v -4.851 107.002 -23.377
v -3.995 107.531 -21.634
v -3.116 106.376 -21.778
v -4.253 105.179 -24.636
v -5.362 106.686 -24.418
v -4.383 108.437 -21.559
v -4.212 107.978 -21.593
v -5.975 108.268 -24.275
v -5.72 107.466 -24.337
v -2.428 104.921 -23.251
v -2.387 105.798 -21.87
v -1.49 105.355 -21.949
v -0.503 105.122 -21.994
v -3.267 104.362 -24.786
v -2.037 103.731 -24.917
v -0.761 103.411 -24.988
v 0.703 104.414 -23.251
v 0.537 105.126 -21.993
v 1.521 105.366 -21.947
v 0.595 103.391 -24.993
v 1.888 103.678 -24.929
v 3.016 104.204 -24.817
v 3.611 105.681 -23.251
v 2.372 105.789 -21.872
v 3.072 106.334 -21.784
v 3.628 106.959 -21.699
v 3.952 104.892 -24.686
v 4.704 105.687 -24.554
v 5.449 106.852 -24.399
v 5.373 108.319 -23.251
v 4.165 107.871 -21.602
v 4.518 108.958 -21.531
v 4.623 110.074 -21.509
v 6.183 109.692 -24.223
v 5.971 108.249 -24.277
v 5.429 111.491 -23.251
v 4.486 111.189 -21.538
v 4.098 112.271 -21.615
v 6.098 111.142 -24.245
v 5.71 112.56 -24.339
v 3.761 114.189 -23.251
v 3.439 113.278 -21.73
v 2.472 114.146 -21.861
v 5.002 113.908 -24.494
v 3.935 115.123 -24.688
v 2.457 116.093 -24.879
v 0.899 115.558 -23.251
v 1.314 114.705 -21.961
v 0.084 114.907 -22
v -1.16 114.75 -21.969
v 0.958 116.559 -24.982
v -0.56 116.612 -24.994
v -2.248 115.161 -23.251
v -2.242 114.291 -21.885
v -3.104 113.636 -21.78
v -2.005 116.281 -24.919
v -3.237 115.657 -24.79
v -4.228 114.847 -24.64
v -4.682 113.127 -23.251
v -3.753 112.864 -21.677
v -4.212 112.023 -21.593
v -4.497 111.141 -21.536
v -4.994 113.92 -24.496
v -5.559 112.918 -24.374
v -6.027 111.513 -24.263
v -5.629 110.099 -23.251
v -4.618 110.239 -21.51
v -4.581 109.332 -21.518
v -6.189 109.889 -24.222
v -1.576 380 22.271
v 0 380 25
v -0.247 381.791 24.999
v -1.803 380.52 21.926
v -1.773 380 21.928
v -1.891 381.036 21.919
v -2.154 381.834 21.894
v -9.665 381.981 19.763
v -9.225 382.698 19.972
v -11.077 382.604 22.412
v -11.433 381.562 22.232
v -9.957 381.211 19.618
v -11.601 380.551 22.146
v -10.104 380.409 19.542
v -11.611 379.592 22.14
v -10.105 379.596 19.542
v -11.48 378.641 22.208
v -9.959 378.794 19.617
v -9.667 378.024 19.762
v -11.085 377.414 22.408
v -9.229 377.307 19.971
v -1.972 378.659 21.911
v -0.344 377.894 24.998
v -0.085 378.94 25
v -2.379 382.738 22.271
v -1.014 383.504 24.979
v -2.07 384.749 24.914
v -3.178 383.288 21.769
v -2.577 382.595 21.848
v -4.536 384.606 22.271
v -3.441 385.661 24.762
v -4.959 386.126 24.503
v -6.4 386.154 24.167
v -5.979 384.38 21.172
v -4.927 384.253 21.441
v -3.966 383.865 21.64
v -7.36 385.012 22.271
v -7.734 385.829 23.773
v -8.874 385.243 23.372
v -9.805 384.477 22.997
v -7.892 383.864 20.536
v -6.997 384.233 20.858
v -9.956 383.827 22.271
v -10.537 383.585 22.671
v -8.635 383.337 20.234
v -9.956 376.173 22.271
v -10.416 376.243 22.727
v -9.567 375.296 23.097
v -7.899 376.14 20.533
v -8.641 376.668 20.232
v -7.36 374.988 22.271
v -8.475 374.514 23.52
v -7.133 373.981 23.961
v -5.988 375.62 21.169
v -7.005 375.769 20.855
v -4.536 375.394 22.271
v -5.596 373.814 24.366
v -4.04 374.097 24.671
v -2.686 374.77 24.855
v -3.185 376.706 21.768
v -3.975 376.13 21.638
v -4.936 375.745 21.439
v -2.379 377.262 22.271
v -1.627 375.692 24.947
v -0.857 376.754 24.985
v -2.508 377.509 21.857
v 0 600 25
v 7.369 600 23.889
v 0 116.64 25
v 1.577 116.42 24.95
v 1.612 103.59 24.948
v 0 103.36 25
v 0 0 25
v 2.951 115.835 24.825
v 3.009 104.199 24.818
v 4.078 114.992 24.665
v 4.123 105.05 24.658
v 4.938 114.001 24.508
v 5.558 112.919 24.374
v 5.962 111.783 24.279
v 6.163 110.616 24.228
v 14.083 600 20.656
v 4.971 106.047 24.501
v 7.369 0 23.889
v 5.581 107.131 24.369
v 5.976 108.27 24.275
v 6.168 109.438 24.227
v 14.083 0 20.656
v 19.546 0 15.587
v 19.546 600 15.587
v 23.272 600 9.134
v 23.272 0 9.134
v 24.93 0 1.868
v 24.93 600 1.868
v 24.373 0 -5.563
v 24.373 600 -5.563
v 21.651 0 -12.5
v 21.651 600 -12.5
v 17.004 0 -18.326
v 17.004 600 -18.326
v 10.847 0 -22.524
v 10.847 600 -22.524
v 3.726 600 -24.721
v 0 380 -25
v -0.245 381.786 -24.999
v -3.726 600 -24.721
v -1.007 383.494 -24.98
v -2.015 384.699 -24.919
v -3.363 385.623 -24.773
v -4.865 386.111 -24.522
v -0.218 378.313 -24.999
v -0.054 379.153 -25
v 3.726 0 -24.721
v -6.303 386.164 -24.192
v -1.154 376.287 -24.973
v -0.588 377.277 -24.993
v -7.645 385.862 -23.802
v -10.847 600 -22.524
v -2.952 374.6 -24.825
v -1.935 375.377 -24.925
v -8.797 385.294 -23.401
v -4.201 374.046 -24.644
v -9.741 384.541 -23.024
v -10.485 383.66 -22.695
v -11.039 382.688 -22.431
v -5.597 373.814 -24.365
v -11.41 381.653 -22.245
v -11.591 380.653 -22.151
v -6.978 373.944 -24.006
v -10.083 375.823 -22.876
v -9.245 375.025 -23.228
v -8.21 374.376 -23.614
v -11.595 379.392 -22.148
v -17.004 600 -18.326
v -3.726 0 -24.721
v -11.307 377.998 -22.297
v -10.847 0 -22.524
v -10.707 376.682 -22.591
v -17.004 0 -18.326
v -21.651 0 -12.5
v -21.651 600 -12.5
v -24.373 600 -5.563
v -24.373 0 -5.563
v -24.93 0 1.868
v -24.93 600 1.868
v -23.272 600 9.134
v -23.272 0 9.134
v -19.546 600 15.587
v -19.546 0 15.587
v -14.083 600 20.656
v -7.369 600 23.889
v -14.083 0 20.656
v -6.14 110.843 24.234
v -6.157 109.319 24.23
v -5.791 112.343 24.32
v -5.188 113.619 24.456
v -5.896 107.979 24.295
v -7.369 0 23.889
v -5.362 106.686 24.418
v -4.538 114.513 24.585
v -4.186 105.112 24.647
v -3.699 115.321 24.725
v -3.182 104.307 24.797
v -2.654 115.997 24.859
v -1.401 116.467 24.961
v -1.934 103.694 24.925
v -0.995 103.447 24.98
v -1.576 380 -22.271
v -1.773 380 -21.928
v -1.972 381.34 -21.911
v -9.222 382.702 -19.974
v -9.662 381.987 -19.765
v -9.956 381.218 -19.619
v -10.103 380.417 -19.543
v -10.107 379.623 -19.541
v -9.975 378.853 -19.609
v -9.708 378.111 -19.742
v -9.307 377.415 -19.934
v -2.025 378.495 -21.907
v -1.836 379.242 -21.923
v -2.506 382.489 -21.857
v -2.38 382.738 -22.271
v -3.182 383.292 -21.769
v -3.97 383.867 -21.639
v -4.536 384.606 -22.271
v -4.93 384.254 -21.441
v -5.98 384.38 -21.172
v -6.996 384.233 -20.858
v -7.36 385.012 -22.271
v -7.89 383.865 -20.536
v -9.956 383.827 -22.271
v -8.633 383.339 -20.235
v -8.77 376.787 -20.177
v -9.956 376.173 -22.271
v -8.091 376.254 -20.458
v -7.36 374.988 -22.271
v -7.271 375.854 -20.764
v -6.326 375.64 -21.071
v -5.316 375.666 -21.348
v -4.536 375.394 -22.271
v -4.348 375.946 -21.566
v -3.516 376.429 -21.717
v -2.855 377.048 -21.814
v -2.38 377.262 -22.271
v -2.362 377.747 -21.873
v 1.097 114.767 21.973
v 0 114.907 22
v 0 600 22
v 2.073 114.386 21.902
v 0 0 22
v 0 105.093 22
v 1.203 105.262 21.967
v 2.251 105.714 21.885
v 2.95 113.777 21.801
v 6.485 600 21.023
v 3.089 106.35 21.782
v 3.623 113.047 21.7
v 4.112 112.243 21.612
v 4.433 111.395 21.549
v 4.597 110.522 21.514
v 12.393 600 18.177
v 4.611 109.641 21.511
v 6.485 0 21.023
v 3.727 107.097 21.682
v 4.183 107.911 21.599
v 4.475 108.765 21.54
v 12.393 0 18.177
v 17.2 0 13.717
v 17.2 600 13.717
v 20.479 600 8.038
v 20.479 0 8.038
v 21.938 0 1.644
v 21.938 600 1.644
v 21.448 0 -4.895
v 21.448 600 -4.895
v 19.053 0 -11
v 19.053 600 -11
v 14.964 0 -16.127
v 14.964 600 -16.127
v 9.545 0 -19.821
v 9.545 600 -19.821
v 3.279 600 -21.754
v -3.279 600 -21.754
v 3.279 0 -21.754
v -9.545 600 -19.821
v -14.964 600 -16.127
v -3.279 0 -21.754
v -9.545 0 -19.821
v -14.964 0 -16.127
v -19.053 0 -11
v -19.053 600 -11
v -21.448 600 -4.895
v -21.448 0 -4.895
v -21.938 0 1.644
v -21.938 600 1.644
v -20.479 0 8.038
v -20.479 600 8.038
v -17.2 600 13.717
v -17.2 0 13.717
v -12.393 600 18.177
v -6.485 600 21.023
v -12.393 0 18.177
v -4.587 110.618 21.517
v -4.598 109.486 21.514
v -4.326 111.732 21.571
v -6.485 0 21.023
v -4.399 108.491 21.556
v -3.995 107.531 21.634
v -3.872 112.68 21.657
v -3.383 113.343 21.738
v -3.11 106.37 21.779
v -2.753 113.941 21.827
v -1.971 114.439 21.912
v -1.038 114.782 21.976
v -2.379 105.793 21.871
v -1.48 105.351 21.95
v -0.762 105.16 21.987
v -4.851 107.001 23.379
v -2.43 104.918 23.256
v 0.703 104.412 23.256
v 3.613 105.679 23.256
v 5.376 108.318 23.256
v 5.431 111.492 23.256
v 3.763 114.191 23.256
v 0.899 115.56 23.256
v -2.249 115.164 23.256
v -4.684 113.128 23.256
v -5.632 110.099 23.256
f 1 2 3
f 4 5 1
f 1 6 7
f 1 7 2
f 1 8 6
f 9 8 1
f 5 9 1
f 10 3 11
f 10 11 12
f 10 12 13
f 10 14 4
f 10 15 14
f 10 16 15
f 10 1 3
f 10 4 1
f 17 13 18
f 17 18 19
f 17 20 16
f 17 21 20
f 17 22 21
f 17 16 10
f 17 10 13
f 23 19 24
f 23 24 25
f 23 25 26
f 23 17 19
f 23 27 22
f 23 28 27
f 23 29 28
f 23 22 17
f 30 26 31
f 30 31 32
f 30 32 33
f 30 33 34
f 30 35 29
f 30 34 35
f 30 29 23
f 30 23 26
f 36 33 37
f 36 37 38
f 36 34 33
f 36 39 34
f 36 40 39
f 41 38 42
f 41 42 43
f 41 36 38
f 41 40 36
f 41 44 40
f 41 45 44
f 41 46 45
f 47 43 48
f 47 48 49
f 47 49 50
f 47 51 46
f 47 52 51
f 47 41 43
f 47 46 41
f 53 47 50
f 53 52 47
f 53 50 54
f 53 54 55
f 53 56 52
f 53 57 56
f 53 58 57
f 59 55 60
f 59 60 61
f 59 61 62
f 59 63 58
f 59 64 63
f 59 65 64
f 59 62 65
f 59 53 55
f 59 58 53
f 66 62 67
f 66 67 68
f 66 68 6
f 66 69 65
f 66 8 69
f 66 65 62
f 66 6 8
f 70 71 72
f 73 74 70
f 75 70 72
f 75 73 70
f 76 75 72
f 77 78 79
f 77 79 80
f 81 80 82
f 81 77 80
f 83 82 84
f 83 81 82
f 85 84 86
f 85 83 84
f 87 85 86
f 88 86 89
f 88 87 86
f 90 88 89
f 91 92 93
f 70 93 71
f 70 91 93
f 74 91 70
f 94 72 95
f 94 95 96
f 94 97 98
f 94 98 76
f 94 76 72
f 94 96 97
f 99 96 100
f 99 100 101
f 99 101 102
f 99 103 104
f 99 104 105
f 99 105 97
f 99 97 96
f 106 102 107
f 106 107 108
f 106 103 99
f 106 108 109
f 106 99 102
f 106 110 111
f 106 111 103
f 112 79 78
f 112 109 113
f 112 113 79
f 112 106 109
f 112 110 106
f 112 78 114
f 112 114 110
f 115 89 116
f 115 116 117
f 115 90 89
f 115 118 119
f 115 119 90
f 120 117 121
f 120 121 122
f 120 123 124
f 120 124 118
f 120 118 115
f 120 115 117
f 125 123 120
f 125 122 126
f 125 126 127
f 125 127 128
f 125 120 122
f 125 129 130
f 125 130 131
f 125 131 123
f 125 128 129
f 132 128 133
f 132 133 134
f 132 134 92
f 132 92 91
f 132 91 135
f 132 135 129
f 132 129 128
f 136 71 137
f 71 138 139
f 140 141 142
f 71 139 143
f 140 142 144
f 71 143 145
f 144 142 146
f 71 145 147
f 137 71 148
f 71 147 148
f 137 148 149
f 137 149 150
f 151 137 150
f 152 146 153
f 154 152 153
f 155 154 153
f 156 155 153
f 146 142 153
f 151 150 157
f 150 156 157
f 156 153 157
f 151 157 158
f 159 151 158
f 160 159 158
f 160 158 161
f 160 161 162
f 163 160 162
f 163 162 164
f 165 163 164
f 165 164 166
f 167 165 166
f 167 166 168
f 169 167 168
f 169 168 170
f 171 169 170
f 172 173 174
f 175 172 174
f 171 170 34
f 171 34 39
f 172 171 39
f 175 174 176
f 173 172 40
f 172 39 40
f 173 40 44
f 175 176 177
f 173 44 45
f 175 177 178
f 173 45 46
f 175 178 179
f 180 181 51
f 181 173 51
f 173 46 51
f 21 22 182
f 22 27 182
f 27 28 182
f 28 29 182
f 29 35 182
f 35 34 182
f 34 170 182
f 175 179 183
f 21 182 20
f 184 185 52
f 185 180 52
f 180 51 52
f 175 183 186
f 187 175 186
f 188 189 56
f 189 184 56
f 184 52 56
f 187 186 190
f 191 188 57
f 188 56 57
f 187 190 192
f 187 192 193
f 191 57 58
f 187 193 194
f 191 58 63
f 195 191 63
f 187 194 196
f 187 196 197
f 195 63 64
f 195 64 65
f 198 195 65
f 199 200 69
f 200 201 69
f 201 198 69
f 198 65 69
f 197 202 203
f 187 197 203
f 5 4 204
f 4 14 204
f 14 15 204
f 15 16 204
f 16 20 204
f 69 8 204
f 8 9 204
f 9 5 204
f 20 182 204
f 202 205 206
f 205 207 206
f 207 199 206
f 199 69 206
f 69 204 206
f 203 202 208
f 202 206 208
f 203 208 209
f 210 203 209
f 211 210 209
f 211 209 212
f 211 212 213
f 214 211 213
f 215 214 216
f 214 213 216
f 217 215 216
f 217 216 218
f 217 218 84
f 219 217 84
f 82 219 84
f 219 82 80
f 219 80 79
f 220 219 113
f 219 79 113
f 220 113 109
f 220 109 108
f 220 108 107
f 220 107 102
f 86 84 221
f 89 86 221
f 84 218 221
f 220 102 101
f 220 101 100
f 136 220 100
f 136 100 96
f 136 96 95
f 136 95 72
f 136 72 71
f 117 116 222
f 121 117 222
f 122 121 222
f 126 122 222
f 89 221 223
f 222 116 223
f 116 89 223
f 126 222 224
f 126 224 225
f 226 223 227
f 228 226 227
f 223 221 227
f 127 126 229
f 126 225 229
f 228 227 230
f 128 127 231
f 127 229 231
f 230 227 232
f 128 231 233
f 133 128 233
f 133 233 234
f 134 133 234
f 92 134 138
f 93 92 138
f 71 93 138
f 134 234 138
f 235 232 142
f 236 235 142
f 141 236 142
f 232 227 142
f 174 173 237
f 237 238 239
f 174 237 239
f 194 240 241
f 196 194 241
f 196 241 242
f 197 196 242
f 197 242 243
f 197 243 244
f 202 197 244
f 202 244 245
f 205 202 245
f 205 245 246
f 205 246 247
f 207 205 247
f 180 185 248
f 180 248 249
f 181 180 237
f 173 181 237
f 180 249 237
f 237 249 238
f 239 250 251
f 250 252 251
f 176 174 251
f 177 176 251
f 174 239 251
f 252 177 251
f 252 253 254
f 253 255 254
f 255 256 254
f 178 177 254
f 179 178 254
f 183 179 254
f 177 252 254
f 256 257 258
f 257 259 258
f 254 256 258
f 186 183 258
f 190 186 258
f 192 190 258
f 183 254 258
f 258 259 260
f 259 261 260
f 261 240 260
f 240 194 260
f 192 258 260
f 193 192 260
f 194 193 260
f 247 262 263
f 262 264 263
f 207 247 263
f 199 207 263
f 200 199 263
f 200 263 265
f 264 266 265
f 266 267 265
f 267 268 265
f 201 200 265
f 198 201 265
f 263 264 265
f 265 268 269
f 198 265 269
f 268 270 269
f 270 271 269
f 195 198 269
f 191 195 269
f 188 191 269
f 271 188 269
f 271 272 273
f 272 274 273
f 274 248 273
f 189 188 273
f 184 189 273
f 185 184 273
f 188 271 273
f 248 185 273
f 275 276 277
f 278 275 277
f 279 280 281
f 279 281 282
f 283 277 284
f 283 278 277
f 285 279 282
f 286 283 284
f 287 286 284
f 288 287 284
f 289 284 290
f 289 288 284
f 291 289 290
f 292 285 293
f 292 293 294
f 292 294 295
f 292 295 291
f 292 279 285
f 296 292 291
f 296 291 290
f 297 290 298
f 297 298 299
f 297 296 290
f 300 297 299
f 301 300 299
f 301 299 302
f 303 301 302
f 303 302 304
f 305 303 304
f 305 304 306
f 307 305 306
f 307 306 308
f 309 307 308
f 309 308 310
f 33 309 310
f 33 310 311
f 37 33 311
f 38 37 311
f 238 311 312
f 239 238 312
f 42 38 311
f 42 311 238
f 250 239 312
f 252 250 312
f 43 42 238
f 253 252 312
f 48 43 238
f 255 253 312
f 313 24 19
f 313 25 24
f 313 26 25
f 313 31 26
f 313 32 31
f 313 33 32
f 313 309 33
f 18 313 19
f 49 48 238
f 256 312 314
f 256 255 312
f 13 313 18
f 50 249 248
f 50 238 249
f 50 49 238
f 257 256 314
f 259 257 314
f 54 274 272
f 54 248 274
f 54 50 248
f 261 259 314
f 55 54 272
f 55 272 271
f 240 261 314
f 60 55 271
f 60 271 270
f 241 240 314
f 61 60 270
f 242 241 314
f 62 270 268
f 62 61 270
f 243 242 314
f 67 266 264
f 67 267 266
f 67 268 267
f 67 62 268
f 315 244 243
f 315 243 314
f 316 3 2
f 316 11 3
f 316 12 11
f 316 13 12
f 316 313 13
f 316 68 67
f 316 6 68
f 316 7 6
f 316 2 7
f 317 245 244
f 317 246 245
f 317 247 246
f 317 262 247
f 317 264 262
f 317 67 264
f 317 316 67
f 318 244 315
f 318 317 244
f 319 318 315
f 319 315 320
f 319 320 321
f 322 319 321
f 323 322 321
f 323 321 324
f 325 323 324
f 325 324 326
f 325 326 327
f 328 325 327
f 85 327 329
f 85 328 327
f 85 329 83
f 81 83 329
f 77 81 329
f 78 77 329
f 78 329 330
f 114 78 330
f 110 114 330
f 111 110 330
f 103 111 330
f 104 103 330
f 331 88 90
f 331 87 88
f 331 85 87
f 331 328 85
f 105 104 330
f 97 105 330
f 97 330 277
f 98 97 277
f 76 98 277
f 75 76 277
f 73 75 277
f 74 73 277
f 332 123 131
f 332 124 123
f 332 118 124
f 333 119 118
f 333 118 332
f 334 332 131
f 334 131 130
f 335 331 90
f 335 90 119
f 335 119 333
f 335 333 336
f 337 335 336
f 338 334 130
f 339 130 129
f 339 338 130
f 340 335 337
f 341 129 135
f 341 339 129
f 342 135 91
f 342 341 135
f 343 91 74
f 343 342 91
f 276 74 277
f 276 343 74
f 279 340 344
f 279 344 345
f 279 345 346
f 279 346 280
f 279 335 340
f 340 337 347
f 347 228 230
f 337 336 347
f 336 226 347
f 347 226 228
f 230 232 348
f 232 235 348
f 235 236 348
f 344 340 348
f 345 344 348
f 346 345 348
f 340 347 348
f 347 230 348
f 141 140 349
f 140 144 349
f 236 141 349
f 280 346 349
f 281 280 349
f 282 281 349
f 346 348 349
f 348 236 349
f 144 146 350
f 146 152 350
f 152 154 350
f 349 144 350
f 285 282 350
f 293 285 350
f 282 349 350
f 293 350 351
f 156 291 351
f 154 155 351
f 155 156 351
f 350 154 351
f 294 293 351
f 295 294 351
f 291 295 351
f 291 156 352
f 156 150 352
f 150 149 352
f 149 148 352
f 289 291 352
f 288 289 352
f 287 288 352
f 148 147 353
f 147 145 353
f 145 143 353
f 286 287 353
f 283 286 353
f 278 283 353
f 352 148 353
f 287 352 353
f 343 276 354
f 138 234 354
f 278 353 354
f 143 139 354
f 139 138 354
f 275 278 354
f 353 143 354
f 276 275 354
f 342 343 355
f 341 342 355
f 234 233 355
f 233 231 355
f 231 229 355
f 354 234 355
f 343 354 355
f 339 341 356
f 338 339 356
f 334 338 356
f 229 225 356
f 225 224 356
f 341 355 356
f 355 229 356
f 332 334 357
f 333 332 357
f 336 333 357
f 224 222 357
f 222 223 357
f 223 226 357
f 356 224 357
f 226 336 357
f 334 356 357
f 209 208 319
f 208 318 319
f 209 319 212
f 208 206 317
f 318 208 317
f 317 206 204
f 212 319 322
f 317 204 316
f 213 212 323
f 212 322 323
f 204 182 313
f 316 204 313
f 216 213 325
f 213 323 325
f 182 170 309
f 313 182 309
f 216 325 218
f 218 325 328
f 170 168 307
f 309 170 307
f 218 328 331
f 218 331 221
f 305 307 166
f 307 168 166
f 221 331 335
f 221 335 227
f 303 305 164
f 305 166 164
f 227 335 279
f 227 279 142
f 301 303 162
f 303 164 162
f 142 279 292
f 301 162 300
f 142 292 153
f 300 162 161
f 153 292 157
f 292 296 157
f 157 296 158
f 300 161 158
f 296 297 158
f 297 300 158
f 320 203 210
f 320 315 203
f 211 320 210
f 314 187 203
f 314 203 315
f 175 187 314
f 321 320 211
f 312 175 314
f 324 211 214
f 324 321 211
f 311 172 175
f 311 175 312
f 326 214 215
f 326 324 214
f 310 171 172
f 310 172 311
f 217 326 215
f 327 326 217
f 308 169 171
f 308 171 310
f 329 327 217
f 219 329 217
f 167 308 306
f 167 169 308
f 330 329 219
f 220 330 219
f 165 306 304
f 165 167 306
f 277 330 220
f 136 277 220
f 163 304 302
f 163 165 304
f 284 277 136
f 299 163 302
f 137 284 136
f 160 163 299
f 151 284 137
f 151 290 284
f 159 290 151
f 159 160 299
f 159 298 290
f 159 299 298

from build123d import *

# Parameters (mm, degrees)
SKETCH1_R           = 25
SKETCH1_R_2         = 22
BOSS_EXTRUDE1_DEPTH = 600


with BuildPart() as part:
    # Sketch1 → Boss-Extrude1 (new body)
    with BuildSketch(Plane(origin=(0, 0, 0), x_dir=(1, 0, 0), z_dir=(0, 1, 0))):
        Circle(SKETCH1_R)
        Circle(SKETCH1_R_2, mode=Mode.SUBTRACT)
    extrude(amount=BOSS_EXTRUDE1_DEPTH)

    # Sketch4 → Cut-Revolve3 (revolve, cut)
    with BuildSketch(Plane(origin=(-103.136389545, 380, -329.994936254), x_dir=(-1, 0, 0), z_dir=(0, -1, 0))):
        Polygon((-96.496861449, -304.994936254), (-96.496861449, -316.494936254), (-103.136389545, -304.994936254), align=None)
    cut_revolve3 = revolve(axis=Axis((-6.639528096, 380, -25), (0, 0, 1)), mode=Mode.SUBTRACT)

    # Sketch5 → Cut-Revolve4 (revolve, cut)
    with BuildSketch(Plane(origin=(-103.136389545, 110, -329.994936254), x_dir=(-1, 0, 0), z_dir=(0, -1, 0))):
        Polygon((-103.136389545, -304.994936254), (-103.136389545, -316.494936254), (-96.496861449, -304.994936254), align=None)
    cut_revolve4 = revolve(axis=Axis((0, 110, -25), (0, 0, 1)), mode=Mode.SUBTRACT)

    # Mirror3: Cut-Revolve3, Cut-Revolve4 across plane
    add(cut_revolve3.mirror(Plane.XY), mode=Mode.SUBTRACT)
    add(cut_revolve4.mirror(Plane.XY), mode=Mode.SUBTRACT)


solid = part.part
